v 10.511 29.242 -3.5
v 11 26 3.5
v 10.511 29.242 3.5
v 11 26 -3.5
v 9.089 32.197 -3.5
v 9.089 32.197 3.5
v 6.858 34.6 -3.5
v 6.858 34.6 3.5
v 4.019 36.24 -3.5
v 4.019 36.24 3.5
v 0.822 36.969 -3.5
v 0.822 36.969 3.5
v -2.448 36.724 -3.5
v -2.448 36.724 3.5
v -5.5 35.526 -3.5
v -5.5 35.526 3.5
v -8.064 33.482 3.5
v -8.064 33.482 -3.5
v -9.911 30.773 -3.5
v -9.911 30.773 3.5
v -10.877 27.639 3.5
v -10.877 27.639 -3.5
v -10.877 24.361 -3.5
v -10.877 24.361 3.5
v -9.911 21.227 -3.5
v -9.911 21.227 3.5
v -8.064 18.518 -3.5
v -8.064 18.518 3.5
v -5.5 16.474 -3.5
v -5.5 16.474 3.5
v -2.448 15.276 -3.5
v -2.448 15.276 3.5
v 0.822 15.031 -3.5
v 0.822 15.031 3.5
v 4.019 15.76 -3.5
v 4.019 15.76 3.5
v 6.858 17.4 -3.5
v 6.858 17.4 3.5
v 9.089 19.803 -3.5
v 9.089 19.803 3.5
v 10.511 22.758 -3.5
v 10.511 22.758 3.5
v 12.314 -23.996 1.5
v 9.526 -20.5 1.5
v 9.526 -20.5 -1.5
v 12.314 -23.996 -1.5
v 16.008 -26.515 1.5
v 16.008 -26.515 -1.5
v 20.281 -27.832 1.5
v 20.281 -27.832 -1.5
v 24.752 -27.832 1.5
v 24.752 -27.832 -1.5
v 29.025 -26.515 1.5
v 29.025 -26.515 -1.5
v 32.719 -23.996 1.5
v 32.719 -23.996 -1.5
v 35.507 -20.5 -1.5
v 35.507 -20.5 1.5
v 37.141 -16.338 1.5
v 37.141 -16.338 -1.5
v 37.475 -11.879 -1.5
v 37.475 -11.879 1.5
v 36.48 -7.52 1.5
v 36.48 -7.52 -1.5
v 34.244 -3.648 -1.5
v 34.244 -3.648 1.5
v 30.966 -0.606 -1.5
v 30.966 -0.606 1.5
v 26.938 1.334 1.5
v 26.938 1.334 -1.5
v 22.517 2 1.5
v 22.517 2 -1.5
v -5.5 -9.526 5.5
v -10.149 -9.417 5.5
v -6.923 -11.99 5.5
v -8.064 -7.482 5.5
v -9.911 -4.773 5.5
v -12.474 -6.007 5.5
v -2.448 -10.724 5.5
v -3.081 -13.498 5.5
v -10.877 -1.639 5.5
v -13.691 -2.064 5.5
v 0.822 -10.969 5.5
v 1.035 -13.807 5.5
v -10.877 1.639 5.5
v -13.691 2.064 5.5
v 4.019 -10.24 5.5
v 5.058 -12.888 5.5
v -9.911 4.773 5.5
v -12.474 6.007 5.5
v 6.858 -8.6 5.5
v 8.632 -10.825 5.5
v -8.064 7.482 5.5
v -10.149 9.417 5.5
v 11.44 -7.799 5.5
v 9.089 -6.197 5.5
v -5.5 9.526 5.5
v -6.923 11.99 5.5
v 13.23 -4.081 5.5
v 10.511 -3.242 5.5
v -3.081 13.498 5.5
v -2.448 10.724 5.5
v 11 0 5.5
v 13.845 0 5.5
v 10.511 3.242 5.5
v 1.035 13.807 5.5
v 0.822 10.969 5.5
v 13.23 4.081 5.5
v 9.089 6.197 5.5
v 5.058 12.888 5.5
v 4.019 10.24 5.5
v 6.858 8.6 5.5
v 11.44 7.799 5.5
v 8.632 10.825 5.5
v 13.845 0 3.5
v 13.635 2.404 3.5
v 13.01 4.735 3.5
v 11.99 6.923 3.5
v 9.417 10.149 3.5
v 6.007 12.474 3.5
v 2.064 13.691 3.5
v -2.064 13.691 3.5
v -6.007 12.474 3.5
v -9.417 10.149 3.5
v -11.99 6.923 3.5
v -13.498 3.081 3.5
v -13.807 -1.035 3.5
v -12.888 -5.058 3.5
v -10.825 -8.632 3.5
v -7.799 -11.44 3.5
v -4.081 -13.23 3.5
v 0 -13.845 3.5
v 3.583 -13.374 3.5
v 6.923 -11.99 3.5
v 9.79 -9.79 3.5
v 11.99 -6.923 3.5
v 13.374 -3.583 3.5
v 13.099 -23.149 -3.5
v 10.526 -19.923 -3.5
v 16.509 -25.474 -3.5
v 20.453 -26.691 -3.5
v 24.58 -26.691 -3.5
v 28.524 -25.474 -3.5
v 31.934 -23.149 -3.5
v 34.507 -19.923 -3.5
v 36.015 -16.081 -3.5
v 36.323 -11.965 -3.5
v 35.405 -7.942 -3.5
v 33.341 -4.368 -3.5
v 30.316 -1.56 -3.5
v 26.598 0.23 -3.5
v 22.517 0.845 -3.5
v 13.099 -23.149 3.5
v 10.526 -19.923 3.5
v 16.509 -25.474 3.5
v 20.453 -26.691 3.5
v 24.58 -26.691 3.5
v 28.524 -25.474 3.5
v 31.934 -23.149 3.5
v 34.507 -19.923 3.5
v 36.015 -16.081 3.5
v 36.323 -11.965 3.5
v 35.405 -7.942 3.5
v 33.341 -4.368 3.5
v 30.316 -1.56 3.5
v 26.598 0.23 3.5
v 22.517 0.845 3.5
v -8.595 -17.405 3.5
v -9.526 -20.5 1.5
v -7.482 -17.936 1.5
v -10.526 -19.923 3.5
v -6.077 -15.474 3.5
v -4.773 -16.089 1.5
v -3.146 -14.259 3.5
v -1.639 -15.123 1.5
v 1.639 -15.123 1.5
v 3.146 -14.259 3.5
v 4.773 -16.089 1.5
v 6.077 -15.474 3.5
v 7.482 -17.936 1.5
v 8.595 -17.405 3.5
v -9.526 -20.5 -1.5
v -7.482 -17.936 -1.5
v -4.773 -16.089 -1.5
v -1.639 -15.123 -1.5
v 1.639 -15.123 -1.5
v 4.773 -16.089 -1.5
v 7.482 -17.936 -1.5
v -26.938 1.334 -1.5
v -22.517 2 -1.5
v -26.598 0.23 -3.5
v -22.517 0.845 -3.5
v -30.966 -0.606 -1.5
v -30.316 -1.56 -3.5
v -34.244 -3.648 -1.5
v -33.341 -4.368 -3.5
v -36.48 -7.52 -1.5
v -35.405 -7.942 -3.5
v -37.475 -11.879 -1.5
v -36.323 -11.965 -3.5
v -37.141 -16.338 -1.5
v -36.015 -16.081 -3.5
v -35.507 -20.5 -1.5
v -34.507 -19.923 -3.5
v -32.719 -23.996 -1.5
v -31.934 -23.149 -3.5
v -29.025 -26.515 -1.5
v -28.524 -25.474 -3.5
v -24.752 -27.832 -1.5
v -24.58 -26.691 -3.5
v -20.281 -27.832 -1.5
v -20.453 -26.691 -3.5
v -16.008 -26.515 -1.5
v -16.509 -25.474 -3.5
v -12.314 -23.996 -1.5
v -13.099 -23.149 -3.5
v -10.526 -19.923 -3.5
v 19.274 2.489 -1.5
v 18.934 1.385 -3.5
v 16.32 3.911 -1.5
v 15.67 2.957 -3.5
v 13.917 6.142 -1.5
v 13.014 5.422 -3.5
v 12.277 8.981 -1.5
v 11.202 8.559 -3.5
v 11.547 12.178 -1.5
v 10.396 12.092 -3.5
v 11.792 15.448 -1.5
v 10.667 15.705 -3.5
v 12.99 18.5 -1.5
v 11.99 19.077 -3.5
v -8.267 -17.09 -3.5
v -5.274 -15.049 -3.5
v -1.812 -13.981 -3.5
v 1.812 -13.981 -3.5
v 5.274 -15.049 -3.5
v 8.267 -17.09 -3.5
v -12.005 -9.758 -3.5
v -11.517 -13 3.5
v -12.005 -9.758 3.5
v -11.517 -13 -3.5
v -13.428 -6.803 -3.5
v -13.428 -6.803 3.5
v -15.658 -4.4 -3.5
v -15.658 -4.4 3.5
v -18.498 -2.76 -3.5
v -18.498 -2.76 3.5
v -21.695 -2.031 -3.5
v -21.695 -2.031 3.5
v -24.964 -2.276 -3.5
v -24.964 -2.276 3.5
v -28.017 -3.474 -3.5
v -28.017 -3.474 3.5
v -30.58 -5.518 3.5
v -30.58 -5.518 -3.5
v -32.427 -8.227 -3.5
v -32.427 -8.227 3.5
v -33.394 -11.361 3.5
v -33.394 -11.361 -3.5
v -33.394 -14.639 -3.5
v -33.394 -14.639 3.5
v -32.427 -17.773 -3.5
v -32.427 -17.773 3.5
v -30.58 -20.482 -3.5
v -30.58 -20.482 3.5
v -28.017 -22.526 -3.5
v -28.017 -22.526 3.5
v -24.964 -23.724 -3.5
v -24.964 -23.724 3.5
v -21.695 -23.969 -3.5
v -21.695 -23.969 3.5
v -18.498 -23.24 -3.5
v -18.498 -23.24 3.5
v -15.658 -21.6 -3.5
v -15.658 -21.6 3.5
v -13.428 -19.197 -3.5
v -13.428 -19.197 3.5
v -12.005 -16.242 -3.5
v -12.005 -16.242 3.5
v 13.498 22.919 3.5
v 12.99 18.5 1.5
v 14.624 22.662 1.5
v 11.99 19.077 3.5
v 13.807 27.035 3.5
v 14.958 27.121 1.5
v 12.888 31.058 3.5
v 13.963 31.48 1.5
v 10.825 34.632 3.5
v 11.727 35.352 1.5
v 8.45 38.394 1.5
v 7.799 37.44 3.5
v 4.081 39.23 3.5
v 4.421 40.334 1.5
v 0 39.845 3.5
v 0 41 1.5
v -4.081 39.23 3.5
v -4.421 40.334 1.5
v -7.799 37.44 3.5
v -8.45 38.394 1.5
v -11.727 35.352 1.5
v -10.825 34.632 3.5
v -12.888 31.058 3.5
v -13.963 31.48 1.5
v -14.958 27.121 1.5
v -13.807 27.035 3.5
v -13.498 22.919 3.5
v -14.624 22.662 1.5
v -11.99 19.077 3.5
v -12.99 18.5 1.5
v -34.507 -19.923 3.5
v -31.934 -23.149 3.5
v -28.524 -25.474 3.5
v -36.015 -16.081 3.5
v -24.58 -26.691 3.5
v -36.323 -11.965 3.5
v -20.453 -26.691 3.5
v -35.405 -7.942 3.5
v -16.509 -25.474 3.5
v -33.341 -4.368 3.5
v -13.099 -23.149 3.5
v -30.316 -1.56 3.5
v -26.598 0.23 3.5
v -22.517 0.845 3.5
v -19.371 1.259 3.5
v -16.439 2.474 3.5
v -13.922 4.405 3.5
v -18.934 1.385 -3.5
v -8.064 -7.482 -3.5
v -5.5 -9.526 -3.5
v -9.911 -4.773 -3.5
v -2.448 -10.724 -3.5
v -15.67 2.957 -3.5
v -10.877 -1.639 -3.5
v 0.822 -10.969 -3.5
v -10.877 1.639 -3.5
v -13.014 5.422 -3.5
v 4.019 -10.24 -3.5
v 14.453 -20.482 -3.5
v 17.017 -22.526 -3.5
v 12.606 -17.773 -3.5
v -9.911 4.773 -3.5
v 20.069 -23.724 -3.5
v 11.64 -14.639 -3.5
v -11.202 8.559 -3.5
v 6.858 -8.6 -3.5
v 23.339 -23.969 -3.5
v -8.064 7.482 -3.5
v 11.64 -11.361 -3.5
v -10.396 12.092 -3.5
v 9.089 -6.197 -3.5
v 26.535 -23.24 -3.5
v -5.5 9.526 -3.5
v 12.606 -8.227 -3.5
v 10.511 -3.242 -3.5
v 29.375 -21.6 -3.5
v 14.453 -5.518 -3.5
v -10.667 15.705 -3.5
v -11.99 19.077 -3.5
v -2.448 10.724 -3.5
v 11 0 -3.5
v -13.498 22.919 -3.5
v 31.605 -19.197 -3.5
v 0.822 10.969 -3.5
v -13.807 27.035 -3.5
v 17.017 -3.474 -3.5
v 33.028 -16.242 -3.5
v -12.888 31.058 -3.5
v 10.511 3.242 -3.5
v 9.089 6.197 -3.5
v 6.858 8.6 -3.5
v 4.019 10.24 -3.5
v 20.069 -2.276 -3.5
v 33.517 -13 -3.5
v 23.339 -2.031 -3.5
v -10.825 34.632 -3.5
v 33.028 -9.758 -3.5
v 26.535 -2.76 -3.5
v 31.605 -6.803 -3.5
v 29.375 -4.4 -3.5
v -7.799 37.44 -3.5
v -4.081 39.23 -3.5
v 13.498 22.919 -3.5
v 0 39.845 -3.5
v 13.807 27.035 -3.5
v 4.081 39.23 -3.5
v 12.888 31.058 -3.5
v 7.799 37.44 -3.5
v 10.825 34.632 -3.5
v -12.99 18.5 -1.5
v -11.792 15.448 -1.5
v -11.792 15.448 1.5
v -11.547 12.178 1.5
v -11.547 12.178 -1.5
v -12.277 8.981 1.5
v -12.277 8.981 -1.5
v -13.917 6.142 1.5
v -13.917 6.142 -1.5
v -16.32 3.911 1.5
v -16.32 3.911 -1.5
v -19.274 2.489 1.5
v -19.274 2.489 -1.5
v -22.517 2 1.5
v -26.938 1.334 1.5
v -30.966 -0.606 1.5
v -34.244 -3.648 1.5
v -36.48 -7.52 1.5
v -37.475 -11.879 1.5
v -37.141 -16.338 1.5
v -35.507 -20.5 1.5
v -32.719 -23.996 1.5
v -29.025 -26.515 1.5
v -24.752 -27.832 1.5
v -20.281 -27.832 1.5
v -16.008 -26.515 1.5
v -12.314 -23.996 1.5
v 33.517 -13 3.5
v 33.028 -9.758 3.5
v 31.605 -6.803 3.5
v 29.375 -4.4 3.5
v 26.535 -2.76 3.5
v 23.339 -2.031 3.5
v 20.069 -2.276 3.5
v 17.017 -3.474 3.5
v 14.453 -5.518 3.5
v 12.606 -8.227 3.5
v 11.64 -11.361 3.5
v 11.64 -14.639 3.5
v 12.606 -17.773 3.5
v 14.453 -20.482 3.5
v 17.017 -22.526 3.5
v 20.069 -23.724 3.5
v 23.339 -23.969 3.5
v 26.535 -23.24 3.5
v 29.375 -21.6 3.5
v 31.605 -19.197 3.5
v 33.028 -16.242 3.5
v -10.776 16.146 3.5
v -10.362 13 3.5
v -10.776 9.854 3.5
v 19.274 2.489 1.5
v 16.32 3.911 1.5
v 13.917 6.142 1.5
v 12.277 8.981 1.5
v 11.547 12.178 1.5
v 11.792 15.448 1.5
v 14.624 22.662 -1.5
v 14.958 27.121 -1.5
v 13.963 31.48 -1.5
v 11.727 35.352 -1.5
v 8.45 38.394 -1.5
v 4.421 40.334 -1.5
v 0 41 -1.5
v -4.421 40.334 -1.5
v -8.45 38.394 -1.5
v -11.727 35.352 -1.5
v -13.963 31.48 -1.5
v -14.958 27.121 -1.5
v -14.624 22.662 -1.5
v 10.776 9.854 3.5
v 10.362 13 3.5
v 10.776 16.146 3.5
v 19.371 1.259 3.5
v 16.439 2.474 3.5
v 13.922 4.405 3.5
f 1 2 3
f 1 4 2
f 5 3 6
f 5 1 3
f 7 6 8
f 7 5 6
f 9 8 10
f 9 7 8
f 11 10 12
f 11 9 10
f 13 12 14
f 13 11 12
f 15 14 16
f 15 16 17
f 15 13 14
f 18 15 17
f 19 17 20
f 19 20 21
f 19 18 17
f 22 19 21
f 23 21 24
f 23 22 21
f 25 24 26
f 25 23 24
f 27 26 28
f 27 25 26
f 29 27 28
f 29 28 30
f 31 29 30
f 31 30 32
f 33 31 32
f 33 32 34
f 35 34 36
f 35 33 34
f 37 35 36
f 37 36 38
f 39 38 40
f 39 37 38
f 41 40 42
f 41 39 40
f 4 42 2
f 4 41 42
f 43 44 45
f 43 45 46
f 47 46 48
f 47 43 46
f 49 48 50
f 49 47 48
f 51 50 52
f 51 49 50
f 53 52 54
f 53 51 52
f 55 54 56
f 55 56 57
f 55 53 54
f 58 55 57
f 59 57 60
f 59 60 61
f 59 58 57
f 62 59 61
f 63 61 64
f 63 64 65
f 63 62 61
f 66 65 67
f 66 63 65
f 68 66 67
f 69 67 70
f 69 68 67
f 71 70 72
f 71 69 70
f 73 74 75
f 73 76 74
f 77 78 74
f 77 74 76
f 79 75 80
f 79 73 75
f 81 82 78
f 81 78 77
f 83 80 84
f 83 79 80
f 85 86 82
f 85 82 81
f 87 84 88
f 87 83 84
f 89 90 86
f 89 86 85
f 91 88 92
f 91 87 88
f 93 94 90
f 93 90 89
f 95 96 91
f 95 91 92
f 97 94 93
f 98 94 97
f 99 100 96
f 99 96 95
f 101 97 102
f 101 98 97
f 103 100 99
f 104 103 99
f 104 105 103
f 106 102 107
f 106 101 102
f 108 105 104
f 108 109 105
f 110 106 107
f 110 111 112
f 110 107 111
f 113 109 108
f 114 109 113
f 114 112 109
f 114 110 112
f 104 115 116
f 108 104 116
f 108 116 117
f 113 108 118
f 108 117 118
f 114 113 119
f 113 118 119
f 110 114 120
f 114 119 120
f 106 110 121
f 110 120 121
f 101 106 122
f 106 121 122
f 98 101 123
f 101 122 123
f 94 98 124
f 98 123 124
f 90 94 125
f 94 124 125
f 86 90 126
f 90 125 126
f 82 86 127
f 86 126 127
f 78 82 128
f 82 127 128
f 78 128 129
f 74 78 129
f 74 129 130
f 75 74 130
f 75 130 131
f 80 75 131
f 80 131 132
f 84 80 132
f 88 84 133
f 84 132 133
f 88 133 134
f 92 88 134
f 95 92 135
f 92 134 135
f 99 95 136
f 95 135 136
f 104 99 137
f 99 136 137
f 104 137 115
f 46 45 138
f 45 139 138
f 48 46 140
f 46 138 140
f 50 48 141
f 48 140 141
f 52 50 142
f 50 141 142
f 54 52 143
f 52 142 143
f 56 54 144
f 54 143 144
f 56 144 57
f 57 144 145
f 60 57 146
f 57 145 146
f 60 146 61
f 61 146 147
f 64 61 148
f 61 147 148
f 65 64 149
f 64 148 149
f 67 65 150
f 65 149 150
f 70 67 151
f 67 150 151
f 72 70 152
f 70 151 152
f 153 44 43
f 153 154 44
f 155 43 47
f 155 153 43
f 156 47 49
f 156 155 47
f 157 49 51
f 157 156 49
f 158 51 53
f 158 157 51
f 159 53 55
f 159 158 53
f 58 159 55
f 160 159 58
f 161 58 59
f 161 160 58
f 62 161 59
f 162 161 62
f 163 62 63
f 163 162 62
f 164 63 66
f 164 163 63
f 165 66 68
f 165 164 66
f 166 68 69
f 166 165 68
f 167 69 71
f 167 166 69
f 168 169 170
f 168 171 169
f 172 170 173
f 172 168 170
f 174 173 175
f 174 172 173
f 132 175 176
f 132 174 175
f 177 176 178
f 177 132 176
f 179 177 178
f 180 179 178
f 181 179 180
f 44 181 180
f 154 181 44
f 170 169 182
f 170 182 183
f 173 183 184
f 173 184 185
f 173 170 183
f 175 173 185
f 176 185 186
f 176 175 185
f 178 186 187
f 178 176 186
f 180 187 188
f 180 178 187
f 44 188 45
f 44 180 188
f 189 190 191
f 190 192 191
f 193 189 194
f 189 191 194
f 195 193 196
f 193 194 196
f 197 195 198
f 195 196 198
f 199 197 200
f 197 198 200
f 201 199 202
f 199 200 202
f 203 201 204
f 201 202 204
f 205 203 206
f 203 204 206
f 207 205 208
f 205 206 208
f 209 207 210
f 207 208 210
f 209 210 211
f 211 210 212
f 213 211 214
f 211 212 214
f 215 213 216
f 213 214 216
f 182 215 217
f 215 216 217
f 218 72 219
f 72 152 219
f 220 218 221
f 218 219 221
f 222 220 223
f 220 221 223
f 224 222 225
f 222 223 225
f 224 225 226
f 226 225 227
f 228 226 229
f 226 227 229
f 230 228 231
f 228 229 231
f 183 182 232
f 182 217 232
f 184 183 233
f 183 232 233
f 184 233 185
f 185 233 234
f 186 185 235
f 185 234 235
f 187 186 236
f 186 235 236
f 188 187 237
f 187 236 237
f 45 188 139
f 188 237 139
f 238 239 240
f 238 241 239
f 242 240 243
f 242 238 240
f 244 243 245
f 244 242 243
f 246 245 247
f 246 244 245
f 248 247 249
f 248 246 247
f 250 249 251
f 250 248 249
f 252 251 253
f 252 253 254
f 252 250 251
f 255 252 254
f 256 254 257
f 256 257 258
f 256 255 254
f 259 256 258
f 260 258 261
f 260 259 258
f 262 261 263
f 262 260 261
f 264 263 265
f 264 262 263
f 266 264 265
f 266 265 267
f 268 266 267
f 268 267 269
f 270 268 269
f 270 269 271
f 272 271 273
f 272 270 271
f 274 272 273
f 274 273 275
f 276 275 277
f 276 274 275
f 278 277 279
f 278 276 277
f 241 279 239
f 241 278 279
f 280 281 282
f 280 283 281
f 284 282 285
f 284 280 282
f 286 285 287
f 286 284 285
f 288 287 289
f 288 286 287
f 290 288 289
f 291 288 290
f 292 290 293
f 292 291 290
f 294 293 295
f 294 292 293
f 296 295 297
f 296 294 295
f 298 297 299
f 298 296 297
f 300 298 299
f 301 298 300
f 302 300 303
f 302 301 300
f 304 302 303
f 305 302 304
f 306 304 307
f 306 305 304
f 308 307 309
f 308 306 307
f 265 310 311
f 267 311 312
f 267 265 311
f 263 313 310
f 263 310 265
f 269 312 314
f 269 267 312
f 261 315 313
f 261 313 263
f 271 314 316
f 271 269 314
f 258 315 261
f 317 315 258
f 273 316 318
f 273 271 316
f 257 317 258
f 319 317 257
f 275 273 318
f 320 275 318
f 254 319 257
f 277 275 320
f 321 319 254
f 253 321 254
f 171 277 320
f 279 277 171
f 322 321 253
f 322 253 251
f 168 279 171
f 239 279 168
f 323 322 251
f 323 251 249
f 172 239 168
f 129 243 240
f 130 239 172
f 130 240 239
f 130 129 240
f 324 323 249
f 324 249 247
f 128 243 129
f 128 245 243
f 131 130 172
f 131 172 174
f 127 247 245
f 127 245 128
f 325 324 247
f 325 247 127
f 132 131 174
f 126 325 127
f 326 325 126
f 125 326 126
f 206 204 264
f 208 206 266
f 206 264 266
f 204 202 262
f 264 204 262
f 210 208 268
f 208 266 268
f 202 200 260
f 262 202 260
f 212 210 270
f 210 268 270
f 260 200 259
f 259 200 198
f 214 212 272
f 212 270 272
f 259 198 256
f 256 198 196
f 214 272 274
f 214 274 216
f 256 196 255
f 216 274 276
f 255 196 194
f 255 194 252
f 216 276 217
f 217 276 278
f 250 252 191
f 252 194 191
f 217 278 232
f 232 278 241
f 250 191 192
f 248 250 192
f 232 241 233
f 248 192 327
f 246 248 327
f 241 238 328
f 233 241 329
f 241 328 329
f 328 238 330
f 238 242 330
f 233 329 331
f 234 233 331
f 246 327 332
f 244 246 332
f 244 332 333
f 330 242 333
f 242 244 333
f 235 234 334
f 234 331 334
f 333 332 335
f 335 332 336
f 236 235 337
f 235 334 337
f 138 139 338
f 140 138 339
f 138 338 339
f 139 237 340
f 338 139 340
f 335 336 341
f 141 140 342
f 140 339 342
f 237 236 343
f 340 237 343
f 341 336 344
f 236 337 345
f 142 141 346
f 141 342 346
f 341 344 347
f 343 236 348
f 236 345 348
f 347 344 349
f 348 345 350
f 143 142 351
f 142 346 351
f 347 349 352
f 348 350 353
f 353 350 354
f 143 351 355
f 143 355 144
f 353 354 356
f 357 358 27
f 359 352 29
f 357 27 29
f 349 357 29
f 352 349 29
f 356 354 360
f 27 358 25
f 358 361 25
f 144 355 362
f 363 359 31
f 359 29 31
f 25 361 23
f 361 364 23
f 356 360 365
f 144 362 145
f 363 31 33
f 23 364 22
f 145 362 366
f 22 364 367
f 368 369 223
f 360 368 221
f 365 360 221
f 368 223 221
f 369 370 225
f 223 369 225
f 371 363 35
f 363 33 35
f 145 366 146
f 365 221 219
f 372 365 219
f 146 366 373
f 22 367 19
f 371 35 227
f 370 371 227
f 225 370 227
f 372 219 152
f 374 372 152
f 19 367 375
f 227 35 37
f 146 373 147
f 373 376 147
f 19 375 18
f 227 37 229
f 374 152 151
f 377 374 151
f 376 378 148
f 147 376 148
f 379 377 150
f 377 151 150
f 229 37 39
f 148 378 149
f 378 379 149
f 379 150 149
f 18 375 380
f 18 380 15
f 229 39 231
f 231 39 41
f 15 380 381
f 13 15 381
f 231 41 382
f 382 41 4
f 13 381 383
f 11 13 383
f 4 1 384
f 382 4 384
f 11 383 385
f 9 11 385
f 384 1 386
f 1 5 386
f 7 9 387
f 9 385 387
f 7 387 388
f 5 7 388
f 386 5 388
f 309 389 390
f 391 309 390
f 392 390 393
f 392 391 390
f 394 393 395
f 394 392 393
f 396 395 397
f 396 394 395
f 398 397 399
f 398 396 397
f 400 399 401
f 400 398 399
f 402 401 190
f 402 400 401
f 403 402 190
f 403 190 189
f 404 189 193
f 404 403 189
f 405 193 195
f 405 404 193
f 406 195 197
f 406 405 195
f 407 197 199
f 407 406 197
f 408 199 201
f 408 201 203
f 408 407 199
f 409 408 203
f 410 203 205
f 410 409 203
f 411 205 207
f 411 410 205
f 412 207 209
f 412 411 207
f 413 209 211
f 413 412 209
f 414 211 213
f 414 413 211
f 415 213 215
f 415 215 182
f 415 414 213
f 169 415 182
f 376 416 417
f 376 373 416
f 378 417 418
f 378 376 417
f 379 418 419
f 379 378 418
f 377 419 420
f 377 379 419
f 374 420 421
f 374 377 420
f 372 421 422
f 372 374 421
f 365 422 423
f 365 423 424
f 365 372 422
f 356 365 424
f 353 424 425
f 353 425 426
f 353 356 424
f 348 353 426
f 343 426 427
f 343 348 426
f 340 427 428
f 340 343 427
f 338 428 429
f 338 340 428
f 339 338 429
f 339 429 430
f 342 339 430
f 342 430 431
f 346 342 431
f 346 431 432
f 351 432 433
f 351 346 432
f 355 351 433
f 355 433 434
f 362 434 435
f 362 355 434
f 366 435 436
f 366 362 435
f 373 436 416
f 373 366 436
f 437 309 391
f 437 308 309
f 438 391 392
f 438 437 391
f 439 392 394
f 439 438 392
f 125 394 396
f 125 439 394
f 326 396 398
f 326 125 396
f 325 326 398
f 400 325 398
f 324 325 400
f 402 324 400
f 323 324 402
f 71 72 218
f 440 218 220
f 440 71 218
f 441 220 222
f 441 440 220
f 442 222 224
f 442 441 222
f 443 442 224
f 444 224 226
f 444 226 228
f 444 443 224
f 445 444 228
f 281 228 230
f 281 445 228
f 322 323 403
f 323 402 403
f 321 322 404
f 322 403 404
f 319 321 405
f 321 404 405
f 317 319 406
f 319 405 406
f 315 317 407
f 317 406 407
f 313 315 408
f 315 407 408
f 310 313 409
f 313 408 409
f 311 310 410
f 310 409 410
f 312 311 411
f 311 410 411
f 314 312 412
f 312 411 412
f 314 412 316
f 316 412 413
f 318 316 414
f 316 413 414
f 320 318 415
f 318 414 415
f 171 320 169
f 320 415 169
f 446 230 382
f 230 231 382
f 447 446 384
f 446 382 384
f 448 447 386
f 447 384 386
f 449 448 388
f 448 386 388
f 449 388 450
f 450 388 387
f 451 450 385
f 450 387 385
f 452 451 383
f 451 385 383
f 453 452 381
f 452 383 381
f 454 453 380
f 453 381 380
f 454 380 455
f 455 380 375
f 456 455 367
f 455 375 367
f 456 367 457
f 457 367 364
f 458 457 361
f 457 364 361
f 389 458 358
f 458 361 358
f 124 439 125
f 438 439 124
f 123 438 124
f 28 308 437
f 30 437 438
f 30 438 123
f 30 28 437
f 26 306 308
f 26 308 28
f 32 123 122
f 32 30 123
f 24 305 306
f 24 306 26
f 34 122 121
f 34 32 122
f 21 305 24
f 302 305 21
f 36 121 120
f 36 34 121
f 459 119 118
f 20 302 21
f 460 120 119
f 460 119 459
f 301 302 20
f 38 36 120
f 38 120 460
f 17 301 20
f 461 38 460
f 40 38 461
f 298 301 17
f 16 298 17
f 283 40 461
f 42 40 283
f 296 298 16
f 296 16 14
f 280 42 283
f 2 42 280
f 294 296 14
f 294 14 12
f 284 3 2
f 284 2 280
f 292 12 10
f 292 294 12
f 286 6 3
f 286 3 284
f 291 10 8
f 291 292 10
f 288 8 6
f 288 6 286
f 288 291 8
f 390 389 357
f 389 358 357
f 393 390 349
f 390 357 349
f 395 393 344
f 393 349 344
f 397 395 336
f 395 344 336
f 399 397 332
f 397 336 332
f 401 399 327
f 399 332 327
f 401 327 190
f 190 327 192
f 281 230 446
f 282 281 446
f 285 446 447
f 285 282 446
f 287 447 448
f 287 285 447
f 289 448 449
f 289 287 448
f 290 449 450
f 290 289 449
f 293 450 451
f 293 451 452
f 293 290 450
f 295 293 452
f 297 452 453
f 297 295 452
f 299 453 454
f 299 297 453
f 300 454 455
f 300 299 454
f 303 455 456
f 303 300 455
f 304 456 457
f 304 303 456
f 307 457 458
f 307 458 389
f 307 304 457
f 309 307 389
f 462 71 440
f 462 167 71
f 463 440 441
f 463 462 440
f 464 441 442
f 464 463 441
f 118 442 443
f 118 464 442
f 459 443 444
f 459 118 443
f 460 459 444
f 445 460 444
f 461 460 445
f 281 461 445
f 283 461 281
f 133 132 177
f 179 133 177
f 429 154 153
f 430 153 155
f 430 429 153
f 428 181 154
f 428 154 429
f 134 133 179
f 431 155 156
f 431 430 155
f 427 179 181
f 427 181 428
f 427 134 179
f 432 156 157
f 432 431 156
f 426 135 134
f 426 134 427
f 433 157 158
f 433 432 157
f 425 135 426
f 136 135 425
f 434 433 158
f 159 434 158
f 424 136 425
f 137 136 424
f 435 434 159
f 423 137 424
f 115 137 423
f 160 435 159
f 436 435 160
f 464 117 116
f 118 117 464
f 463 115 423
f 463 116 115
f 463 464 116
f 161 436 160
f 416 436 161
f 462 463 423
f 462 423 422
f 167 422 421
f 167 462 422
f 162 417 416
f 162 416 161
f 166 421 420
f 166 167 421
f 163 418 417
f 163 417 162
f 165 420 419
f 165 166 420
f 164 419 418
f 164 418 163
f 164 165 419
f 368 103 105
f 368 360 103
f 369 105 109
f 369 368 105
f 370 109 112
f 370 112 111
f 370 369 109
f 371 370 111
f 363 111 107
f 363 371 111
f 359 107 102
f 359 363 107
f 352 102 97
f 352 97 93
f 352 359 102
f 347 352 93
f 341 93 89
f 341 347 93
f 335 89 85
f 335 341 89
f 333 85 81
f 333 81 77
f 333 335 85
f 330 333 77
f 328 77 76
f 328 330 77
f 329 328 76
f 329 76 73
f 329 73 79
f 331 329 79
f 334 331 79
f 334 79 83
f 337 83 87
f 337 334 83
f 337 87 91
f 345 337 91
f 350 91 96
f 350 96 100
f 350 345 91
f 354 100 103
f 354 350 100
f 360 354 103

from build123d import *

# Parameters (mm, degrees)
F0_R          = 11
F1_DEPTH      = 3.5
F2_R          = 11
F3_DEPTH      = 3.501
F3_DEPTH_BACK = 3.501
F4_T2_ANGLE   = 240
F4_T4_ANGLE   = 240
F4_T6_ANGLE   = 120
F4_T8_ANGLE   = 120
F4_T10_ANGLE  = 240
F4_T12_ANGLE  = 240
F4_T14_ANGLE  = 120
F4_T16_ANGLE  = 120
F4_T18_ANGLE  = 240
F4_T20_ANGLE  = 240
F4_T22_ANGLE  = 120
F4_T24_ANGLE  = 120
F5_R          = 13.8452994616
F5_R_2        = 11
F6_DEPTH      = 2


# Not quite as in the source:
# - a fillet or chamfer that OpenCascade refuses, or shapes differently, is made with other operations: its cross-section is extruded or revolved along the edge and cut away or added


with BuildPart() as f1:
    # F0 (on Top) → F1 (new body, symmetric)
    with BuildSketch(Plane.XY):
        with BuildLine():
            ThreePointArc((-22.5166604984, 2), (-35.5070415552, -20.5), (-9.5262794416, -20.5))
            ThreePointArc((-9.5262794416, -20.5), (0, -15), (9.5262794416, -20.5))
            ThreePointArc((9.5262794416, -20.5), (35.5070415552, -20.5), (22.5166604984, 2))
            ThreePointArc((22.5166604984, 2), (12.9903810568, 7.5), (12.9903810568, 18.5))
            ThreePointArc((12.9903810568, 18.5), (0, 41), (-12.9903810568, 18.5))
            ThreePointArc((-12.9903810568, 18.5), (-12.9903810568, 7.5), (-22.5166604984, 2))
        make_face()
        with Locations((-22.5166604984, -13)):
            Circle(F0_R, mode=Mode.SUBTRACT)
        with Locations((22.5166604984, -13)):
            Circle(F0_R, mode=Mode.SUBTRACT)
        Circle(F0_R, mode=Mode.SUBTRACT)
        with Locations((0, 26)):
            Circle(F0_R, mode=Mode.SUBTRACT)
    extrude(amount=F1_DEPTH, both=True)

    # F2 (on Top) → F3 (cut, two sides)
    with BuildSketch(Plane.XY) as f3_sk:
        Circle(F2_R)
    extrude(amount=-F3_DEPTH, mode=Mode.SUBTRACT)
    extrude(f3_sk.sketch, amount=F3_DEPTH_BACK, mode=Mode.SUBTRACT)

    # F4: chamfer of 2 x 1.1547005384 on 12 edges, made by hand

    # F4_s1 → F4_t2 (revolve, cut)
    with BuildSketch(Plane.YZ.offset(-22.5166604984)):
        Polygon((0.8452994616, 3.5), (2, 1.5), (2, 3.5), align=None)
    revolve(axis=Axis((-22.5166604984, -13, 3.5), (0, 0, 1)), revolution_arc=F4_T2_ANGLE, mode=Mode.SUBTRACT)

    # F4_s3 → F4_t4 (revolve, cut)
    with BuildSketch(Plane.YZ.offset(-22.5166604984)):
        Polygon((2, -1.5), (0.8452994616, -3.5), (2, -3.5), align=None)
    revolve(axis=Axis((-22.5166604984, -13, -3.5), (0, 0, 1)), revolution_arc=F4_T4_ANGLE, mode=Mode.SUBTRACT)

    # F4_s5 → F4_t6 (revolve, cut)
    with BuildSketch(Plane(origin=(-11.2583302492, 19.5, 0), x_dir=(0, 0, 1), z_dir=(-0.5, 0.8660254038, 0))):
        Polygon((-1.5, -2), (-3.5, -0.8452994616), (-3.5, -2), align=None)
    revolve(axis=Axis((-22.5166604984, 13, -3.5), (0, 0, -1)), revolution_arc=F4_T6_ANGLE, mode=Mode.SUBTRACT)

    # F4_s7 → F4_t8 (revolve, cut)
    with BuildSketch(Plane(origin=(-11.2583302492, 19.5, 0), x_dir=(0, 0, 1), z_dir=(-0.5, 0.8660254038, 0))):
        Polygon((1.5, -2), (3.5, -0.8452994616), (3.5, -2), align=None)
    revolve(axis=Axis((-22.5166604984, 13, 3.5), (0, 0, -1)), revolution_arc=F4_T8_ANGLE, mode=Mode.SUBTRACT)

    # F4_s9 → F4_t10 (revolve, cut)
    with BuildSketch(Plane(origin=(11.2583302492, 19.5, 0), x_dir=(0, 0, 1), z_dir=(-0.5, -0.8660254038, 0))):
        Polygon((-1.5, -2), (-3.5, -0.8452994616), (-3.5, -2), align=None)
    revolve(axis=Axis((0, 26, -3.5), (0, 0, 1)), revolution_arc=F4_T10_ANGLE, mode=Mode.SUBTRACT)

    # F4_s11 → F4_t12 (revolve, cut)
    with BuildSketch(Plane(origin=(11.2583302492, 19.5, 0), x_dir=(0, 0, 1), z_dir=(-0.5, -0.8660254038, 0))):
        Polygon((1.5, -2), (3.5, -0.8452994616), (3.5, -2), align=None)
    revolve(axis=Axis((0, 26, 3.5), (0, 0, 1)), revolution_arc=F4_T12_ANGLE, mode=Mode.SUBTRACT)

    # F4_s13 → F4_t14 (revolve, cut)
    with BuildSketch(Plane.YZ.offset(22.5166604984)):
        Polygon((2, -1.5), (0.8452994616, -3.5), (2, -3.5), align=None)
    revolve(axis=Axis((22.5166604984, 13, -3.5), (0, 0, -1)), revolution_arc=F4_T14_ANGLE, mode=Mode.SUBTRACT)

    # F4_s15 → F4_t16 (revolve, cut)
    with BuildSketch(Plane.YZ.offset(22.5166604984)):
        Polygon((2, 1.5), (0.8452994616, 3.5), (2, 3.5), align=None)
    revolve(axis=Axis((22.5166604984, 13, 3.5), (0, 0, -1)), revolution_arc=F4_T16_ANGLE, mode=Mode.SUBTRACT)

    # F4_s17 → F4_t18 (revolve, cut)
    with BuildSketch(Plane(origin=(11.2583302492, -19.5, 0), x_dir=(0, 0, 1), z_dir=(-0.5, 0.8660254038, 0))):
        Polygon((-1.5, -2), (-3.5, -0.8452994616), (-3.5, -2), align=None)
    revolve(axis=Axis((22.5166604984, -13, -3.5), (0, 0, 1)), revolution_arc=F4_T18_ANGLE, mode=Mode.SUBTRACT)

    # F4_s19 → F4_t20 (revolve, cut)
    with BuildSketch(Plane(origin=(11.2583302492, -19.5, 0), x_dir=(0, 0, 1), z_dir=(-0.5, 0.8660254038, 0))):
        Polygon((1.5, -2), (3.5, -0.8452994616), (3.5, -2), align=None)
    revolve(axis=Axis((22.5166604984, -13, 3.5), (0, 0, 1)), revolution_arc=F4_T20_ANGLE, mode=Mode.SUBTRACT)

    # F4_s21 → F4_t22 (revolve, cut)
    with BuildSketch(Plane(origin=(-11.2583302492, -19.5, 0), x_dir=(0, 0, 1), z_dir=(-0.5, -0.8660254038, 0))):
        Polygon((-1.5, -2), (-3.5, -0.8452994616), (-3.5, -2), align=None)
    revolve(axis=Axis((0, -26, -3.5), (0, 0, -1)), revolution_arc=F4_T22_ANGLE, mode=Mode.SUBTRACT)

    # F4_s23 → F4_t24 (revolve, cut)
    with BuildSketch(Plane(origin=(-11.2583302492, -19.5, 0), x_dir=(0, 0, 1), z_dir=(-0.5, -0.8660254038, 0))):
        Polygon((1.5, -2), (3.5, -0.8452994616), (3.5, -2), align=None)
    revolve(axis=Axis((0, -26, 3.5), (0, 0, -1)), revolution_arc=F4_T24_ANGLE, mode=Mode.SUBTRACT)

    # F5 (on face) → F6 (join)
    with BuildSketch(Plane.XY.offset(3.5)):
        Circle(F5_R)
        Circle(F5_R_2, mode=Mode.SUBTRACT)
    extrude(amount=F6_DEPTH)


solid = f1.part
